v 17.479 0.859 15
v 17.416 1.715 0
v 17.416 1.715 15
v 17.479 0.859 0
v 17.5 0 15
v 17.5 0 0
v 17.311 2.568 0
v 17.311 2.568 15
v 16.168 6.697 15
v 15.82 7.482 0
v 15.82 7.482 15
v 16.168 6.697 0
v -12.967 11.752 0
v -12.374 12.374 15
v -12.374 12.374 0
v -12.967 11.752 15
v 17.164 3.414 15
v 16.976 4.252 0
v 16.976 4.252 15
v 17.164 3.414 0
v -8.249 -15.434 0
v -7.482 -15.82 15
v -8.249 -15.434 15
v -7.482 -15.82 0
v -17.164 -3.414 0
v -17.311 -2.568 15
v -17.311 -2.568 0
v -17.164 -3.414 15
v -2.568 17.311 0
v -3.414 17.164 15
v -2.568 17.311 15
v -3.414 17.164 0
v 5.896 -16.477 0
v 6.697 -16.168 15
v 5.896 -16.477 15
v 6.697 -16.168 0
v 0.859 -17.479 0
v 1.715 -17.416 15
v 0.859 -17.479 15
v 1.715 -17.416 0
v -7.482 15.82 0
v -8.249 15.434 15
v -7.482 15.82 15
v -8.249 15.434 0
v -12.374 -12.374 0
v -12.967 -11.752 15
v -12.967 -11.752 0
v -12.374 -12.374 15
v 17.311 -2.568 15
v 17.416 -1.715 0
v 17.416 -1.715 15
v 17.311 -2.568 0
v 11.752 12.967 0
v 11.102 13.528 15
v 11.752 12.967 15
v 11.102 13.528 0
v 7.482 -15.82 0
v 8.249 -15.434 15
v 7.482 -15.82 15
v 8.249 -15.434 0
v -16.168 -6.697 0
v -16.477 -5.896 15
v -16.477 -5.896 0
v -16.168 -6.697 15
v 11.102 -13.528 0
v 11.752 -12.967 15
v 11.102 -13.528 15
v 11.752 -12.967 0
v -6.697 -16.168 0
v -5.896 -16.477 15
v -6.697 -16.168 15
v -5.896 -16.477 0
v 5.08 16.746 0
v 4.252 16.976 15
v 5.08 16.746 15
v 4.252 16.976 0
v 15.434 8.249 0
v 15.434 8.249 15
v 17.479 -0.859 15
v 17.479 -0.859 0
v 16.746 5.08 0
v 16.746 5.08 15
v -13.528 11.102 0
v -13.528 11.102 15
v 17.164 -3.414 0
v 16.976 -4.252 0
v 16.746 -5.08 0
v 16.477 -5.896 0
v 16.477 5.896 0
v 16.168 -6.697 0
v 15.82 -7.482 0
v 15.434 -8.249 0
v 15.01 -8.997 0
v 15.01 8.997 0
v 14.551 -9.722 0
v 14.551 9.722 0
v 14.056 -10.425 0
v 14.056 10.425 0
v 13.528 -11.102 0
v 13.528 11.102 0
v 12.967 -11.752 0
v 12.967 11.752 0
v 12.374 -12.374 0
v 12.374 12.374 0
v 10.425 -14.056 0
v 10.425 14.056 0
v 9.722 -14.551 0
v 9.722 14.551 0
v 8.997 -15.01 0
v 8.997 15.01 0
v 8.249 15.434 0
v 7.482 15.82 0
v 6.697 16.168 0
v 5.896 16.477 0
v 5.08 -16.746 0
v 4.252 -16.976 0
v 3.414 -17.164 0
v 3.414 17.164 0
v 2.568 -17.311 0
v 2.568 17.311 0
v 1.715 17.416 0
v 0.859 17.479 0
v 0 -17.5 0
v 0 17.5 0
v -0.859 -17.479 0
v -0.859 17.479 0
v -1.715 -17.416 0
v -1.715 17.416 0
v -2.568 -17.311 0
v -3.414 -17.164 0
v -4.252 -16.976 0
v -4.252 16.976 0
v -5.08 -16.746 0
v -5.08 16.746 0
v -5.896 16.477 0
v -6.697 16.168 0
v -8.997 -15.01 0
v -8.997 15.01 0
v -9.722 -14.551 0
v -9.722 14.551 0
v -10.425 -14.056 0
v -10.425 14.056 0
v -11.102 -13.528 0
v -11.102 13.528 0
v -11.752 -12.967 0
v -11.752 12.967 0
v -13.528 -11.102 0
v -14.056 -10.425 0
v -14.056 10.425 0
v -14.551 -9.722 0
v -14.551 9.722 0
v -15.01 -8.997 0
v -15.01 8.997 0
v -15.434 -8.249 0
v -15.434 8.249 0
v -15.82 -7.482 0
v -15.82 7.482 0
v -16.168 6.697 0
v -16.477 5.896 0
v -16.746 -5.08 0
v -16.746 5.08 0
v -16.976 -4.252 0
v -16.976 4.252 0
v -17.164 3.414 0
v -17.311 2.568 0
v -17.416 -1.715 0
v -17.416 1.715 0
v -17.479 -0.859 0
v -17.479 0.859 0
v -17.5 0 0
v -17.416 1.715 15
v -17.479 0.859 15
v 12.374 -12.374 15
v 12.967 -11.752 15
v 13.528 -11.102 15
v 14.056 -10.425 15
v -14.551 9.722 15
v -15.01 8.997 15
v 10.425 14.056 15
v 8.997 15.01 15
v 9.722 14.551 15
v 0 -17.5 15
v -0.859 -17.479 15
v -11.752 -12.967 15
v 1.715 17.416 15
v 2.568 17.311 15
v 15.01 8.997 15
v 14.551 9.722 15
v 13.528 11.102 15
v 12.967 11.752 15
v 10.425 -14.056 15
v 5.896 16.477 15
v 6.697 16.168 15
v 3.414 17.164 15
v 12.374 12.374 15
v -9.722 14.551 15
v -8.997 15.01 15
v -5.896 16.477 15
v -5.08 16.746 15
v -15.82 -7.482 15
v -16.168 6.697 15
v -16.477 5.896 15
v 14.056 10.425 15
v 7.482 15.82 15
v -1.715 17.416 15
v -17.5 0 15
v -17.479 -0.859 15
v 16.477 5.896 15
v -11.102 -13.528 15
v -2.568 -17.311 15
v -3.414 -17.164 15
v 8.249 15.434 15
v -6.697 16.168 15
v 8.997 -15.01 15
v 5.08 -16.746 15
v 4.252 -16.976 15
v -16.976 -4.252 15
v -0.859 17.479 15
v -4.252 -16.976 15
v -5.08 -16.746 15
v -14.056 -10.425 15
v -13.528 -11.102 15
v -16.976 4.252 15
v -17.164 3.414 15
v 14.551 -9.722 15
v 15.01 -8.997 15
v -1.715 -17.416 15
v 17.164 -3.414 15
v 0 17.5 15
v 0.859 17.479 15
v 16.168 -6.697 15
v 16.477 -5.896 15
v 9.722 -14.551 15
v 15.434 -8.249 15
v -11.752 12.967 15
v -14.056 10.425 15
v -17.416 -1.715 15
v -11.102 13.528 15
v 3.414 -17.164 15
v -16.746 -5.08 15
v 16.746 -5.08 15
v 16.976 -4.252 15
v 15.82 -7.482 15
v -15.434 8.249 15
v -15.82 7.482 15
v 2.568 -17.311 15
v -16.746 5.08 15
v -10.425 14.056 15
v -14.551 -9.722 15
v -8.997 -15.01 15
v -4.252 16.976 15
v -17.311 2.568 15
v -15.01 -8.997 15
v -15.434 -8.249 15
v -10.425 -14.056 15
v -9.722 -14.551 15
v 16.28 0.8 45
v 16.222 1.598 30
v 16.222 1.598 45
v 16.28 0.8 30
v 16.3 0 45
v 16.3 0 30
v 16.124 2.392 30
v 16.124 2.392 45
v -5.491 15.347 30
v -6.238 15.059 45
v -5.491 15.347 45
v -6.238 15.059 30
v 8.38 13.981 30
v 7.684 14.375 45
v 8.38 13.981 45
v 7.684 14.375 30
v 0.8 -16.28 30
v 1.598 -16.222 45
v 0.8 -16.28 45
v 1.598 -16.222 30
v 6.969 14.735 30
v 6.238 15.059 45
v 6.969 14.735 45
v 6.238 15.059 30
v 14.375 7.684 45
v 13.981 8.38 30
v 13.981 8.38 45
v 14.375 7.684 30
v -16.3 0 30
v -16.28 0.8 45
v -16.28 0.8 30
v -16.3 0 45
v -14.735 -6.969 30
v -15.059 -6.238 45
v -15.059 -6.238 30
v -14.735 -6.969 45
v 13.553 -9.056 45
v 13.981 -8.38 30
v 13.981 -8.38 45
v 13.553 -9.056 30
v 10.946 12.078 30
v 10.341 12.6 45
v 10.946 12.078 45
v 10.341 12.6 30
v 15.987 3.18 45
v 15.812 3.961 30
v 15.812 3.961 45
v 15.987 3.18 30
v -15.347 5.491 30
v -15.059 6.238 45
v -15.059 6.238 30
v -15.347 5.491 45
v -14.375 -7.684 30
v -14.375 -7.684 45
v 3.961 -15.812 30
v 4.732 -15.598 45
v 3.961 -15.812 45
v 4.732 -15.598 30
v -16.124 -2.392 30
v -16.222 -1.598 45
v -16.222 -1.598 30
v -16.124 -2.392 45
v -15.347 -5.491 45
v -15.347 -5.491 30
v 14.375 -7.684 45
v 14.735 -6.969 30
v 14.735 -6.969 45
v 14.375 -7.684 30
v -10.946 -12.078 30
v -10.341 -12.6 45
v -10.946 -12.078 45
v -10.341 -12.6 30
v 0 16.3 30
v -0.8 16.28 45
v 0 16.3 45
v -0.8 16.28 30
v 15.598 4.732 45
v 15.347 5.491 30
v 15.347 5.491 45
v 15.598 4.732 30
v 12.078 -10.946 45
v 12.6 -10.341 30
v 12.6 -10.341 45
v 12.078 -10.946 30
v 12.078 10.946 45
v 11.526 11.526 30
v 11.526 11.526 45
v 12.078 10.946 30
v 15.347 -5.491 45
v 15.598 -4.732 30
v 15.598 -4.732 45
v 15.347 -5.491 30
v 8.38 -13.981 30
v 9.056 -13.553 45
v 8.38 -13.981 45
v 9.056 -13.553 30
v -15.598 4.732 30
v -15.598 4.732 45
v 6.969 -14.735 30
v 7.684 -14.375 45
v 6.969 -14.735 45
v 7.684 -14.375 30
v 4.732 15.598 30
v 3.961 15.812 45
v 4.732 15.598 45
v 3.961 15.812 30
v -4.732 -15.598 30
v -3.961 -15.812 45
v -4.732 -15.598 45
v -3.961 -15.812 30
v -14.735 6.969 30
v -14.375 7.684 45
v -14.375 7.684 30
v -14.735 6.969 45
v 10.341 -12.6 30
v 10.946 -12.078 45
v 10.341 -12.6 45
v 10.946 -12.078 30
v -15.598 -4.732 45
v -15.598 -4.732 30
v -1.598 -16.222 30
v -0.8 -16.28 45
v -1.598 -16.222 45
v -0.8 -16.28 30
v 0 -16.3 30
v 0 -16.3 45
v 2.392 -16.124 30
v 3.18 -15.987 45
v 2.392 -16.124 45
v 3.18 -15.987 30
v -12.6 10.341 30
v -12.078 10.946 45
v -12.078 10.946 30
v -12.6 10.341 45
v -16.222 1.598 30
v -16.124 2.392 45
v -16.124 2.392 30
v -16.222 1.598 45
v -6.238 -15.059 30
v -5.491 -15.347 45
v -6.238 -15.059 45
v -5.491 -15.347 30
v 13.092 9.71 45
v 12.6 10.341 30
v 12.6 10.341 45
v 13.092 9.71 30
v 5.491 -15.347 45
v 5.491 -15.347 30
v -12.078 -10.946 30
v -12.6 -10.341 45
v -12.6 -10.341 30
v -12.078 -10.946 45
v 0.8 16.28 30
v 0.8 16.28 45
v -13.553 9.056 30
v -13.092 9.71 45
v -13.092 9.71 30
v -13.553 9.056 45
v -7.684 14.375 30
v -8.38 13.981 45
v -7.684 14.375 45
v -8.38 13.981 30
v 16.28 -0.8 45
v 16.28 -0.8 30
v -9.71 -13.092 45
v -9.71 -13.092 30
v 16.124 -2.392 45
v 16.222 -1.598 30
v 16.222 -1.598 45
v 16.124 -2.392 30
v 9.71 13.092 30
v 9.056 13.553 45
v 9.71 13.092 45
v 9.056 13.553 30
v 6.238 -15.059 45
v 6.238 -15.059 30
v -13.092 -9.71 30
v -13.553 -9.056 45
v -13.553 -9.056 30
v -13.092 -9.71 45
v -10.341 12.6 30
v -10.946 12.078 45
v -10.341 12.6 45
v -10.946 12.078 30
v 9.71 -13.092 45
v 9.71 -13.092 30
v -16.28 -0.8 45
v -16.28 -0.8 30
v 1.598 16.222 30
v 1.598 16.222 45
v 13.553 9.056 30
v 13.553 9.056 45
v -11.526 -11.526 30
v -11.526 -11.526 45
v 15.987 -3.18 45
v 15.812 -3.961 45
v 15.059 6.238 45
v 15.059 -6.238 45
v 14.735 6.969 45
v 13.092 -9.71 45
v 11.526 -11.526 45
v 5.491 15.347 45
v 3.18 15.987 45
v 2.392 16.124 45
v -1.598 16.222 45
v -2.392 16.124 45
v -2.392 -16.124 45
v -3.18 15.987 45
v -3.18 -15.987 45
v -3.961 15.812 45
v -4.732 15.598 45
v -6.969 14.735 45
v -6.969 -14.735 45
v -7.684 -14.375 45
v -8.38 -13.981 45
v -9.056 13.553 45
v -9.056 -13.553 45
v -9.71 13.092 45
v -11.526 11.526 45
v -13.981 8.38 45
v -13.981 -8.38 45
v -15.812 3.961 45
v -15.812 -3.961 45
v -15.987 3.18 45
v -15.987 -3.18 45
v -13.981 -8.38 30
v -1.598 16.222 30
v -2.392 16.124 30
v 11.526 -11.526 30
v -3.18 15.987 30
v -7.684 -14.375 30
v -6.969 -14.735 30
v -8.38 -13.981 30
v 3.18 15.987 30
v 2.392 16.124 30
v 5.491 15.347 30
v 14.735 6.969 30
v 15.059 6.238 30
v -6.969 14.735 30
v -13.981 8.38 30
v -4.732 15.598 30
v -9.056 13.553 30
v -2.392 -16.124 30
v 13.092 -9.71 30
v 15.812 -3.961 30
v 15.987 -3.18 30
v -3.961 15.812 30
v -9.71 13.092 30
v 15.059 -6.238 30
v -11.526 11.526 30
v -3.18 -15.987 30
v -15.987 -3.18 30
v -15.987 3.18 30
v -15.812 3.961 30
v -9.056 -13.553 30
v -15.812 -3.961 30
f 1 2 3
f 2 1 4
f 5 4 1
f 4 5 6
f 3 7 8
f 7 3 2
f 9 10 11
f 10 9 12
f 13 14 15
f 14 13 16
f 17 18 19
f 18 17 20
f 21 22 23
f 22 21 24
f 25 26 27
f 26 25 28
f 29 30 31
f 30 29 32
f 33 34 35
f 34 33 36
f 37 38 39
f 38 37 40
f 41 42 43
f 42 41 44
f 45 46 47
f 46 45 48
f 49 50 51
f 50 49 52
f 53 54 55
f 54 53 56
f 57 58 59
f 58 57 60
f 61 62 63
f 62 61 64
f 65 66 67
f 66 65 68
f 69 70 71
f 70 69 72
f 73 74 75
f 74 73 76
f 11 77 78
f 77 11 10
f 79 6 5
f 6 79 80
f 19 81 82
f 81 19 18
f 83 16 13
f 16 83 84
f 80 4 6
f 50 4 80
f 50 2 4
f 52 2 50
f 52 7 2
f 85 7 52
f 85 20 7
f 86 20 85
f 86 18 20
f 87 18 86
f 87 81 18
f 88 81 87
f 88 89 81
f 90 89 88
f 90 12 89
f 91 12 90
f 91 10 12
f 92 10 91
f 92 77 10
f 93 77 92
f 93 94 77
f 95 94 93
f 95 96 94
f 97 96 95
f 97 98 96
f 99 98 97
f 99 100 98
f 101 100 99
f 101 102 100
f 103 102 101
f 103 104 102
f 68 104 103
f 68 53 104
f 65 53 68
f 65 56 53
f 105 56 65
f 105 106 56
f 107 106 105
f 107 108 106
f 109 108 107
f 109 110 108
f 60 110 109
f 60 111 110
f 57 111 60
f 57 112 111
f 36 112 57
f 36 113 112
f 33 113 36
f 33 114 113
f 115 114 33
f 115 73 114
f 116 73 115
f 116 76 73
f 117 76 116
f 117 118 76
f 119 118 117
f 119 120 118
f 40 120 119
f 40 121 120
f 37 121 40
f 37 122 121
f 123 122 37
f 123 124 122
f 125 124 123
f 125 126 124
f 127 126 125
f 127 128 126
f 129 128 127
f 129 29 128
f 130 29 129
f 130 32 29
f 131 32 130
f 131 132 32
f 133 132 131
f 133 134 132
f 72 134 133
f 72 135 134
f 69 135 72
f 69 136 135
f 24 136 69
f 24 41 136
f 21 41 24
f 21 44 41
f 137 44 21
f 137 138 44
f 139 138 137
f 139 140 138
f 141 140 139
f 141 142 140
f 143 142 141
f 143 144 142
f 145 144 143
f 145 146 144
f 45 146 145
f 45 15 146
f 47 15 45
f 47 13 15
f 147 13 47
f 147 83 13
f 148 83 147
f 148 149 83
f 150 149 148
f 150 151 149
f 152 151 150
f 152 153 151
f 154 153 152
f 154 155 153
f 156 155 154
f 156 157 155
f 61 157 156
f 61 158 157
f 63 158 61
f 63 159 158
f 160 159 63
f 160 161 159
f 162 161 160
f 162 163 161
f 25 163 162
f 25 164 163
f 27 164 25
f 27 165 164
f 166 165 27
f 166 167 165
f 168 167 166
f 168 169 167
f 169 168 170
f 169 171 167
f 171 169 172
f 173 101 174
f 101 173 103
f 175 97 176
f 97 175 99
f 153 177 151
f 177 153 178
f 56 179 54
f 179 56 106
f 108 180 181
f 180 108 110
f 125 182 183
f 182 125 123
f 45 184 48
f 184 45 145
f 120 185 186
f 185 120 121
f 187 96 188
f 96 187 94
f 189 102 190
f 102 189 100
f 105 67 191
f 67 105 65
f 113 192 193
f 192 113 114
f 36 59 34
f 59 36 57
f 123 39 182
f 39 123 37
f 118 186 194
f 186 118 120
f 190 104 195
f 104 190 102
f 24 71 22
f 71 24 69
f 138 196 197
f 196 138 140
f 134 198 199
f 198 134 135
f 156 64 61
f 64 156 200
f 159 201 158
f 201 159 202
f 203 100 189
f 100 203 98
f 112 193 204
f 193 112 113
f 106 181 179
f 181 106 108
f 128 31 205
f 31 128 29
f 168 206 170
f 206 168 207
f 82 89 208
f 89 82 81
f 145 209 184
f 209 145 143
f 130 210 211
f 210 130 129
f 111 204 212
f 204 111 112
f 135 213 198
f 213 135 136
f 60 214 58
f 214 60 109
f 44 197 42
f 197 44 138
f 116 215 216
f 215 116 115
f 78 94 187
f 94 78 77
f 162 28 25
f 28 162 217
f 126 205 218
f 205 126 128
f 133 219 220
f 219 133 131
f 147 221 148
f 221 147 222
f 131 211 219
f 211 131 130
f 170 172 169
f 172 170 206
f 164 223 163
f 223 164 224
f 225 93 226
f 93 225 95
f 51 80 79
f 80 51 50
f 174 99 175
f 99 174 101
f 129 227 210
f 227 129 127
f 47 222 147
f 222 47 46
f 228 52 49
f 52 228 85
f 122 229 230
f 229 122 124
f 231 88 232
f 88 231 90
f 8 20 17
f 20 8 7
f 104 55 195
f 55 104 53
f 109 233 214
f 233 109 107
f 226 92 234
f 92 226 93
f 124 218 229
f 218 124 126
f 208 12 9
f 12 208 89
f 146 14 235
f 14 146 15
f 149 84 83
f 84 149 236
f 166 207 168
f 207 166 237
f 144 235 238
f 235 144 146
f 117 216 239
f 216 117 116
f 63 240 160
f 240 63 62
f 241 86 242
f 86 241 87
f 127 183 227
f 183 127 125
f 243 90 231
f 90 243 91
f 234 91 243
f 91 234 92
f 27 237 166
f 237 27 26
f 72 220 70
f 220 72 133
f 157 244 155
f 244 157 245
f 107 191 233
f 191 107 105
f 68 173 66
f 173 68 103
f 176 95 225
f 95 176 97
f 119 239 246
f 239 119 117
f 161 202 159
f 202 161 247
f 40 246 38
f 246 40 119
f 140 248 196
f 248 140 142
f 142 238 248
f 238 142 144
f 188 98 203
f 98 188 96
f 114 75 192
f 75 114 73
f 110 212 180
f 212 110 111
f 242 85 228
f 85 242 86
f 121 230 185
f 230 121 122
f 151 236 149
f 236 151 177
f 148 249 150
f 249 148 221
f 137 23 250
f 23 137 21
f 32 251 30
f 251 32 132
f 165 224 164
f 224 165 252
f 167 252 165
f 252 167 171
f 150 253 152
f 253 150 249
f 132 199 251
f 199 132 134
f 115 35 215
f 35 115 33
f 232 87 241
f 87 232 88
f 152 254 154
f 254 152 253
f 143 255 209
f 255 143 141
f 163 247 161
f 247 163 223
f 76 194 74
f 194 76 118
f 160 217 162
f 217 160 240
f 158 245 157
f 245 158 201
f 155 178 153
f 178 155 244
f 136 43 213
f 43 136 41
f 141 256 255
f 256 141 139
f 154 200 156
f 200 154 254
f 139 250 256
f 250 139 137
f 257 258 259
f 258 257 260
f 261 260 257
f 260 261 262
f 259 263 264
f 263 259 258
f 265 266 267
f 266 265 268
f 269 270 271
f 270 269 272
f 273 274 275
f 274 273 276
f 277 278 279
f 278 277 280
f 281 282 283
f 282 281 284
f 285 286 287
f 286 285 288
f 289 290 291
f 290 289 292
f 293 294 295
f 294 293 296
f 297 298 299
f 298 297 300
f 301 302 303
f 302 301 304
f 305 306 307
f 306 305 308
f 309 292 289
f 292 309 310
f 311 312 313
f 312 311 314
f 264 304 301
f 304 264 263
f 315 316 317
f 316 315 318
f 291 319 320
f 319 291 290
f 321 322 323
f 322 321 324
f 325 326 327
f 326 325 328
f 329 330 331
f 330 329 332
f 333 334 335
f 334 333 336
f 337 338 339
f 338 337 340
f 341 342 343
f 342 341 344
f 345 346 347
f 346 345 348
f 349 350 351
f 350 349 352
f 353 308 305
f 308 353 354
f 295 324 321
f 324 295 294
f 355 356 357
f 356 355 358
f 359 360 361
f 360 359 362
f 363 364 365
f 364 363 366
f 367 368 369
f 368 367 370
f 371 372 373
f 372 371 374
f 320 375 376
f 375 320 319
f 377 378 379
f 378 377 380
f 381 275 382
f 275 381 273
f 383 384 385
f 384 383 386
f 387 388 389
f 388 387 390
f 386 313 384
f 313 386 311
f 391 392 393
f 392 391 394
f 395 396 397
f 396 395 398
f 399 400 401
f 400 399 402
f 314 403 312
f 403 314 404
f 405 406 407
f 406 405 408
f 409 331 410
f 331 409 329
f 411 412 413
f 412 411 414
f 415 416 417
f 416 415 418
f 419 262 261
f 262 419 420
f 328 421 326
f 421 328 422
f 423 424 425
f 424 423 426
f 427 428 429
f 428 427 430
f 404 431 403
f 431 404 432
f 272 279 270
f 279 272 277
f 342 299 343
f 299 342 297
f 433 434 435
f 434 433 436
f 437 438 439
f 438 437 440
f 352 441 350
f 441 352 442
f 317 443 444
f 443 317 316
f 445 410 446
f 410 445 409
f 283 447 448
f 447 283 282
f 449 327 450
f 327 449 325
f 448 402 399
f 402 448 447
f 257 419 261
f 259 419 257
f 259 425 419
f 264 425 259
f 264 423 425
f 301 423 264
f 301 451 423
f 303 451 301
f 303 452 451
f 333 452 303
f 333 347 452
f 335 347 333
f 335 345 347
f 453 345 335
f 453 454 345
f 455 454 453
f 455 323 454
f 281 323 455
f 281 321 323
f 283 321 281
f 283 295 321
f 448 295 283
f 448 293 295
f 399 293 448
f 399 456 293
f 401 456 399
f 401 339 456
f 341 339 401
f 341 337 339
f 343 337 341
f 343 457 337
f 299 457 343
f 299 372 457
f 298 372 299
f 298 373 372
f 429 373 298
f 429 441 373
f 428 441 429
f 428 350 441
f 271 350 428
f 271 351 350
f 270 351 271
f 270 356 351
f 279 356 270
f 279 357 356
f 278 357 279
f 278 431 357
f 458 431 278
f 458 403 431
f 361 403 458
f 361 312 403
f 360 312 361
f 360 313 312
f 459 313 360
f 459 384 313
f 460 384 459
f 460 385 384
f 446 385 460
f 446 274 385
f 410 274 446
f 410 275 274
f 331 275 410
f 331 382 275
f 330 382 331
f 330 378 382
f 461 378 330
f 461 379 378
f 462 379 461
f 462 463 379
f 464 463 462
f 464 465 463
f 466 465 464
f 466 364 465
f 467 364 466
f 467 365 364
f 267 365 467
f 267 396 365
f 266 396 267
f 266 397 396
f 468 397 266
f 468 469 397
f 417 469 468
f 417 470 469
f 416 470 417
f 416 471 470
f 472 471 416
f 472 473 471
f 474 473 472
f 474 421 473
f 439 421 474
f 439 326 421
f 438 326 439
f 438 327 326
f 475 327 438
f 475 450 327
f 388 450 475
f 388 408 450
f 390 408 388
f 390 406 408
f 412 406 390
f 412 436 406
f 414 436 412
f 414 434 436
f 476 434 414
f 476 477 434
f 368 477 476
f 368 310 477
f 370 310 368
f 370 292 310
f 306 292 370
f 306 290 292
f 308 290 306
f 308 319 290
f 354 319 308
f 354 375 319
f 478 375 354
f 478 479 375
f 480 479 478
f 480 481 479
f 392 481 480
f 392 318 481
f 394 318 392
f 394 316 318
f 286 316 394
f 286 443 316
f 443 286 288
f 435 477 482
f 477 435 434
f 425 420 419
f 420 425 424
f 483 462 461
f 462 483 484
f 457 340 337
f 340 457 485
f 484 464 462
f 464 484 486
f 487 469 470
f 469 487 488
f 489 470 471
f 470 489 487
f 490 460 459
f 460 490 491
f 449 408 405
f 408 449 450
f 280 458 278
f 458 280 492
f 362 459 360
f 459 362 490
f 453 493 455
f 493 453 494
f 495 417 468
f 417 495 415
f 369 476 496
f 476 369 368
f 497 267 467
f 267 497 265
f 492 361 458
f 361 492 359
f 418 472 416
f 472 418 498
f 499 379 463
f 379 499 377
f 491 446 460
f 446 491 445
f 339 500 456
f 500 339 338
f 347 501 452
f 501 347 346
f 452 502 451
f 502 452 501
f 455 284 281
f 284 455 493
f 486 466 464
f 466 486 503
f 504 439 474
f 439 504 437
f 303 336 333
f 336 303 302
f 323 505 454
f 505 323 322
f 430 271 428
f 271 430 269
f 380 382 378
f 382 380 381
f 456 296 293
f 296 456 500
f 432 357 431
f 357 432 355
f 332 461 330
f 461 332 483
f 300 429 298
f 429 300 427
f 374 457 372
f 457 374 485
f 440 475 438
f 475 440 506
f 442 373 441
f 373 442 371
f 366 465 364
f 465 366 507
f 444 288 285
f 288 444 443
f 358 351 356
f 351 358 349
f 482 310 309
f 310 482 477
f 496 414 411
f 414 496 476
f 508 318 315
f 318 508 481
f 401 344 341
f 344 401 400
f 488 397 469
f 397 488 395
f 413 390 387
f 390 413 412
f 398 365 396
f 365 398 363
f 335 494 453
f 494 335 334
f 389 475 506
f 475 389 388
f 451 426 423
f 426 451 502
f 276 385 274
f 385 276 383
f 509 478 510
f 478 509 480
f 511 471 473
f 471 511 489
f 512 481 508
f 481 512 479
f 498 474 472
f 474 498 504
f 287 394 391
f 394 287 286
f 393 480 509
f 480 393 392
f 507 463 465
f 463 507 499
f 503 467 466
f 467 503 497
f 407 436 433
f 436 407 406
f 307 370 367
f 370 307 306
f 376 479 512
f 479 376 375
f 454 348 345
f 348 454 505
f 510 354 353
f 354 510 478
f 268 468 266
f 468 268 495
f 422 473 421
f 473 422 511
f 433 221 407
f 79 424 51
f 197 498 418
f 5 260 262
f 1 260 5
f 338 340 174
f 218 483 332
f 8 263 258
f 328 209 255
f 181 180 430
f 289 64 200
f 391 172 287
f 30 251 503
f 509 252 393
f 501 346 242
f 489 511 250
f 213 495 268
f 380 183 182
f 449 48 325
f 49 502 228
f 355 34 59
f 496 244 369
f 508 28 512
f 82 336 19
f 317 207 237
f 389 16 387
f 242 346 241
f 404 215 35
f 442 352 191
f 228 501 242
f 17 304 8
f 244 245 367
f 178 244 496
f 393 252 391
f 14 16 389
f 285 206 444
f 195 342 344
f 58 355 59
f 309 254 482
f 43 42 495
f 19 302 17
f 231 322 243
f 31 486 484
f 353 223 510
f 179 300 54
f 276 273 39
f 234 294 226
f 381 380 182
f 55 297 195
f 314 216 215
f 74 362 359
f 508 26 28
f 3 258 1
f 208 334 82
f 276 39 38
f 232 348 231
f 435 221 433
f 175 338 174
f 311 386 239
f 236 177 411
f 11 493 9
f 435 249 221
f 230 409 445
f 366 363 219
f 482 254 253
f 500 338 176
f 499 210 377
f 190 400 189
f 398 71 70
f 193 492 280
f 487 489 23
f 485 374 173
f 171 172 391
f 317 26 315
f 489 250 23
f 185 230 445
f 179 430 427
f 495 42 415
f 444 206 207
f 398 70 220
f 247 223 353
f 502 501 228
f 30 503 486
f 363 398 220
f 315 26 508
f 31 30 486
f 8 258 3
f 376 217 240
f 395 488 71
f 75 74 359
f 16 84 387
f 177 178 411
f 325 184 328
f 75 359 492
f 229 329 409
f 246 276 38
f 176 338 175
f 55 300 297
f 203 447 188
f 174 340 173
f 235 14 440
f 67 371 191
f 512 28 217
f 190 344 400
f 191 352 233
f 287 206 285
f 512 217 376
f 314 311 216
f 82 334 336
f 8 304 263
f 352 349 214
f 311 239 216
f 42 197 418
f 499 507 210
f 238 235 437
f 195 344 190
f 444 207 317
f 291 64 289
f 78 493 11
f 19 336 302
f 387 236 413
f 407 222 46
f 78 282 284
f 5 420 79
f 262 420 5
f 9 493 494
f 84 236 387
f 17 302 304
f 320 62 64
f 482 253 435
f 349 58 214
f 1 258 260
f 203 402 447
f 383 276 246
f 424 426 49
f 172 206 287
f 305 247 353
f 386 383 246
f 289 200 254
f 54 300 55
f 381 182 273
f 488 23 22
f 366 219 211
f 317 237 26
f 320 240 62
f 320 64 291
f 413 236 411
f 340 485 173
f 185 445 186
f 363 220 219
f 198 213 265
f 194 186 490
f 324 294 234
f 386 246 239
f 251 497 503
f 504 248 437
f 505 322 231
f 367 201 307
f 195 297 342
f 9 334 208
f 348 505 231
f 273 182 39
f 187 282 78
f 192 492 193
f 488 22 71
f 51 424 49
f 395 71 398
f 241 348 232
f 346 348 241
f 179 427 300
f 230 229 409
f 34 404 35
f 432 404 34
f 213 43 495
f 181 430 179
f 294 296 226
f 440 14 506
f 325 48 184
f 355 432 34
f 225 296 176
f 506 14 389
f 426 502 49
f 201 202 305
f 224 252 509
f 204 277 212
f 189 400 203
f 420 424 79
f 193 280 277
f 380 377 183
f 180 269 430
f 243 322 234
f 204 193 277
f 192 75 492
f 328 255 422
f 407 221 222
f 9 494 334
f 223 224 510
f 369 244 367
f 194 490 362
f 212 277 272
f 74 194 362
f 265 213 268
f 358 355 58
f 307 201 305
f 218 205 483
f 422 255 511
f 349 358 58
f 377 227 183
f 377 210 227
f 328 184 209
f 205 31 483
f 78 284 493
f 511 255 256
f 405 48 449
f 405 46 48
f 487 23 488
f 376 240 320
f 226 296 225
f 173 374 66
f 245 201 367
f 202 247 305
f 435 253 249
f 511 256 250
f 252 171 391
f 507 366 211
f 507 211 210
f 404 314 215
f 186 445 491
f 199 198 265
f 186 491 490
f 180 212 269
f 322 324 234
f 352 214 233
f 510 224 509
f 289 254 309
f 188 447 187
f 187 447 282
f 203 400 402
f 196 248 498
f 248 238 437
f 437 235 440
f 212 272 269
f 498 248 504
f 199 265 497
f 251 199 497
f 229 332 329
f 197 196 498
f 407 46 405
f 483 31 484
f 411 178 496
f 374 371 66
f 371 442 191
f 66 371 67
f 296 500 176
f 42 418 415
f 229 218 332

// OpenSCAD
// Adapter tube to connect vacuum cleaner to renovator, 
// which has the tube of different diameter
$fn=128;
d1=35;
d2=32.6;
h=15;
cylinder(d=d1,h=h);
translate([0,0,2*h])cylinder(d=d2,h=h);
translate([0,0,h])cylinder(d1=d1,d2=d2,h=h);
